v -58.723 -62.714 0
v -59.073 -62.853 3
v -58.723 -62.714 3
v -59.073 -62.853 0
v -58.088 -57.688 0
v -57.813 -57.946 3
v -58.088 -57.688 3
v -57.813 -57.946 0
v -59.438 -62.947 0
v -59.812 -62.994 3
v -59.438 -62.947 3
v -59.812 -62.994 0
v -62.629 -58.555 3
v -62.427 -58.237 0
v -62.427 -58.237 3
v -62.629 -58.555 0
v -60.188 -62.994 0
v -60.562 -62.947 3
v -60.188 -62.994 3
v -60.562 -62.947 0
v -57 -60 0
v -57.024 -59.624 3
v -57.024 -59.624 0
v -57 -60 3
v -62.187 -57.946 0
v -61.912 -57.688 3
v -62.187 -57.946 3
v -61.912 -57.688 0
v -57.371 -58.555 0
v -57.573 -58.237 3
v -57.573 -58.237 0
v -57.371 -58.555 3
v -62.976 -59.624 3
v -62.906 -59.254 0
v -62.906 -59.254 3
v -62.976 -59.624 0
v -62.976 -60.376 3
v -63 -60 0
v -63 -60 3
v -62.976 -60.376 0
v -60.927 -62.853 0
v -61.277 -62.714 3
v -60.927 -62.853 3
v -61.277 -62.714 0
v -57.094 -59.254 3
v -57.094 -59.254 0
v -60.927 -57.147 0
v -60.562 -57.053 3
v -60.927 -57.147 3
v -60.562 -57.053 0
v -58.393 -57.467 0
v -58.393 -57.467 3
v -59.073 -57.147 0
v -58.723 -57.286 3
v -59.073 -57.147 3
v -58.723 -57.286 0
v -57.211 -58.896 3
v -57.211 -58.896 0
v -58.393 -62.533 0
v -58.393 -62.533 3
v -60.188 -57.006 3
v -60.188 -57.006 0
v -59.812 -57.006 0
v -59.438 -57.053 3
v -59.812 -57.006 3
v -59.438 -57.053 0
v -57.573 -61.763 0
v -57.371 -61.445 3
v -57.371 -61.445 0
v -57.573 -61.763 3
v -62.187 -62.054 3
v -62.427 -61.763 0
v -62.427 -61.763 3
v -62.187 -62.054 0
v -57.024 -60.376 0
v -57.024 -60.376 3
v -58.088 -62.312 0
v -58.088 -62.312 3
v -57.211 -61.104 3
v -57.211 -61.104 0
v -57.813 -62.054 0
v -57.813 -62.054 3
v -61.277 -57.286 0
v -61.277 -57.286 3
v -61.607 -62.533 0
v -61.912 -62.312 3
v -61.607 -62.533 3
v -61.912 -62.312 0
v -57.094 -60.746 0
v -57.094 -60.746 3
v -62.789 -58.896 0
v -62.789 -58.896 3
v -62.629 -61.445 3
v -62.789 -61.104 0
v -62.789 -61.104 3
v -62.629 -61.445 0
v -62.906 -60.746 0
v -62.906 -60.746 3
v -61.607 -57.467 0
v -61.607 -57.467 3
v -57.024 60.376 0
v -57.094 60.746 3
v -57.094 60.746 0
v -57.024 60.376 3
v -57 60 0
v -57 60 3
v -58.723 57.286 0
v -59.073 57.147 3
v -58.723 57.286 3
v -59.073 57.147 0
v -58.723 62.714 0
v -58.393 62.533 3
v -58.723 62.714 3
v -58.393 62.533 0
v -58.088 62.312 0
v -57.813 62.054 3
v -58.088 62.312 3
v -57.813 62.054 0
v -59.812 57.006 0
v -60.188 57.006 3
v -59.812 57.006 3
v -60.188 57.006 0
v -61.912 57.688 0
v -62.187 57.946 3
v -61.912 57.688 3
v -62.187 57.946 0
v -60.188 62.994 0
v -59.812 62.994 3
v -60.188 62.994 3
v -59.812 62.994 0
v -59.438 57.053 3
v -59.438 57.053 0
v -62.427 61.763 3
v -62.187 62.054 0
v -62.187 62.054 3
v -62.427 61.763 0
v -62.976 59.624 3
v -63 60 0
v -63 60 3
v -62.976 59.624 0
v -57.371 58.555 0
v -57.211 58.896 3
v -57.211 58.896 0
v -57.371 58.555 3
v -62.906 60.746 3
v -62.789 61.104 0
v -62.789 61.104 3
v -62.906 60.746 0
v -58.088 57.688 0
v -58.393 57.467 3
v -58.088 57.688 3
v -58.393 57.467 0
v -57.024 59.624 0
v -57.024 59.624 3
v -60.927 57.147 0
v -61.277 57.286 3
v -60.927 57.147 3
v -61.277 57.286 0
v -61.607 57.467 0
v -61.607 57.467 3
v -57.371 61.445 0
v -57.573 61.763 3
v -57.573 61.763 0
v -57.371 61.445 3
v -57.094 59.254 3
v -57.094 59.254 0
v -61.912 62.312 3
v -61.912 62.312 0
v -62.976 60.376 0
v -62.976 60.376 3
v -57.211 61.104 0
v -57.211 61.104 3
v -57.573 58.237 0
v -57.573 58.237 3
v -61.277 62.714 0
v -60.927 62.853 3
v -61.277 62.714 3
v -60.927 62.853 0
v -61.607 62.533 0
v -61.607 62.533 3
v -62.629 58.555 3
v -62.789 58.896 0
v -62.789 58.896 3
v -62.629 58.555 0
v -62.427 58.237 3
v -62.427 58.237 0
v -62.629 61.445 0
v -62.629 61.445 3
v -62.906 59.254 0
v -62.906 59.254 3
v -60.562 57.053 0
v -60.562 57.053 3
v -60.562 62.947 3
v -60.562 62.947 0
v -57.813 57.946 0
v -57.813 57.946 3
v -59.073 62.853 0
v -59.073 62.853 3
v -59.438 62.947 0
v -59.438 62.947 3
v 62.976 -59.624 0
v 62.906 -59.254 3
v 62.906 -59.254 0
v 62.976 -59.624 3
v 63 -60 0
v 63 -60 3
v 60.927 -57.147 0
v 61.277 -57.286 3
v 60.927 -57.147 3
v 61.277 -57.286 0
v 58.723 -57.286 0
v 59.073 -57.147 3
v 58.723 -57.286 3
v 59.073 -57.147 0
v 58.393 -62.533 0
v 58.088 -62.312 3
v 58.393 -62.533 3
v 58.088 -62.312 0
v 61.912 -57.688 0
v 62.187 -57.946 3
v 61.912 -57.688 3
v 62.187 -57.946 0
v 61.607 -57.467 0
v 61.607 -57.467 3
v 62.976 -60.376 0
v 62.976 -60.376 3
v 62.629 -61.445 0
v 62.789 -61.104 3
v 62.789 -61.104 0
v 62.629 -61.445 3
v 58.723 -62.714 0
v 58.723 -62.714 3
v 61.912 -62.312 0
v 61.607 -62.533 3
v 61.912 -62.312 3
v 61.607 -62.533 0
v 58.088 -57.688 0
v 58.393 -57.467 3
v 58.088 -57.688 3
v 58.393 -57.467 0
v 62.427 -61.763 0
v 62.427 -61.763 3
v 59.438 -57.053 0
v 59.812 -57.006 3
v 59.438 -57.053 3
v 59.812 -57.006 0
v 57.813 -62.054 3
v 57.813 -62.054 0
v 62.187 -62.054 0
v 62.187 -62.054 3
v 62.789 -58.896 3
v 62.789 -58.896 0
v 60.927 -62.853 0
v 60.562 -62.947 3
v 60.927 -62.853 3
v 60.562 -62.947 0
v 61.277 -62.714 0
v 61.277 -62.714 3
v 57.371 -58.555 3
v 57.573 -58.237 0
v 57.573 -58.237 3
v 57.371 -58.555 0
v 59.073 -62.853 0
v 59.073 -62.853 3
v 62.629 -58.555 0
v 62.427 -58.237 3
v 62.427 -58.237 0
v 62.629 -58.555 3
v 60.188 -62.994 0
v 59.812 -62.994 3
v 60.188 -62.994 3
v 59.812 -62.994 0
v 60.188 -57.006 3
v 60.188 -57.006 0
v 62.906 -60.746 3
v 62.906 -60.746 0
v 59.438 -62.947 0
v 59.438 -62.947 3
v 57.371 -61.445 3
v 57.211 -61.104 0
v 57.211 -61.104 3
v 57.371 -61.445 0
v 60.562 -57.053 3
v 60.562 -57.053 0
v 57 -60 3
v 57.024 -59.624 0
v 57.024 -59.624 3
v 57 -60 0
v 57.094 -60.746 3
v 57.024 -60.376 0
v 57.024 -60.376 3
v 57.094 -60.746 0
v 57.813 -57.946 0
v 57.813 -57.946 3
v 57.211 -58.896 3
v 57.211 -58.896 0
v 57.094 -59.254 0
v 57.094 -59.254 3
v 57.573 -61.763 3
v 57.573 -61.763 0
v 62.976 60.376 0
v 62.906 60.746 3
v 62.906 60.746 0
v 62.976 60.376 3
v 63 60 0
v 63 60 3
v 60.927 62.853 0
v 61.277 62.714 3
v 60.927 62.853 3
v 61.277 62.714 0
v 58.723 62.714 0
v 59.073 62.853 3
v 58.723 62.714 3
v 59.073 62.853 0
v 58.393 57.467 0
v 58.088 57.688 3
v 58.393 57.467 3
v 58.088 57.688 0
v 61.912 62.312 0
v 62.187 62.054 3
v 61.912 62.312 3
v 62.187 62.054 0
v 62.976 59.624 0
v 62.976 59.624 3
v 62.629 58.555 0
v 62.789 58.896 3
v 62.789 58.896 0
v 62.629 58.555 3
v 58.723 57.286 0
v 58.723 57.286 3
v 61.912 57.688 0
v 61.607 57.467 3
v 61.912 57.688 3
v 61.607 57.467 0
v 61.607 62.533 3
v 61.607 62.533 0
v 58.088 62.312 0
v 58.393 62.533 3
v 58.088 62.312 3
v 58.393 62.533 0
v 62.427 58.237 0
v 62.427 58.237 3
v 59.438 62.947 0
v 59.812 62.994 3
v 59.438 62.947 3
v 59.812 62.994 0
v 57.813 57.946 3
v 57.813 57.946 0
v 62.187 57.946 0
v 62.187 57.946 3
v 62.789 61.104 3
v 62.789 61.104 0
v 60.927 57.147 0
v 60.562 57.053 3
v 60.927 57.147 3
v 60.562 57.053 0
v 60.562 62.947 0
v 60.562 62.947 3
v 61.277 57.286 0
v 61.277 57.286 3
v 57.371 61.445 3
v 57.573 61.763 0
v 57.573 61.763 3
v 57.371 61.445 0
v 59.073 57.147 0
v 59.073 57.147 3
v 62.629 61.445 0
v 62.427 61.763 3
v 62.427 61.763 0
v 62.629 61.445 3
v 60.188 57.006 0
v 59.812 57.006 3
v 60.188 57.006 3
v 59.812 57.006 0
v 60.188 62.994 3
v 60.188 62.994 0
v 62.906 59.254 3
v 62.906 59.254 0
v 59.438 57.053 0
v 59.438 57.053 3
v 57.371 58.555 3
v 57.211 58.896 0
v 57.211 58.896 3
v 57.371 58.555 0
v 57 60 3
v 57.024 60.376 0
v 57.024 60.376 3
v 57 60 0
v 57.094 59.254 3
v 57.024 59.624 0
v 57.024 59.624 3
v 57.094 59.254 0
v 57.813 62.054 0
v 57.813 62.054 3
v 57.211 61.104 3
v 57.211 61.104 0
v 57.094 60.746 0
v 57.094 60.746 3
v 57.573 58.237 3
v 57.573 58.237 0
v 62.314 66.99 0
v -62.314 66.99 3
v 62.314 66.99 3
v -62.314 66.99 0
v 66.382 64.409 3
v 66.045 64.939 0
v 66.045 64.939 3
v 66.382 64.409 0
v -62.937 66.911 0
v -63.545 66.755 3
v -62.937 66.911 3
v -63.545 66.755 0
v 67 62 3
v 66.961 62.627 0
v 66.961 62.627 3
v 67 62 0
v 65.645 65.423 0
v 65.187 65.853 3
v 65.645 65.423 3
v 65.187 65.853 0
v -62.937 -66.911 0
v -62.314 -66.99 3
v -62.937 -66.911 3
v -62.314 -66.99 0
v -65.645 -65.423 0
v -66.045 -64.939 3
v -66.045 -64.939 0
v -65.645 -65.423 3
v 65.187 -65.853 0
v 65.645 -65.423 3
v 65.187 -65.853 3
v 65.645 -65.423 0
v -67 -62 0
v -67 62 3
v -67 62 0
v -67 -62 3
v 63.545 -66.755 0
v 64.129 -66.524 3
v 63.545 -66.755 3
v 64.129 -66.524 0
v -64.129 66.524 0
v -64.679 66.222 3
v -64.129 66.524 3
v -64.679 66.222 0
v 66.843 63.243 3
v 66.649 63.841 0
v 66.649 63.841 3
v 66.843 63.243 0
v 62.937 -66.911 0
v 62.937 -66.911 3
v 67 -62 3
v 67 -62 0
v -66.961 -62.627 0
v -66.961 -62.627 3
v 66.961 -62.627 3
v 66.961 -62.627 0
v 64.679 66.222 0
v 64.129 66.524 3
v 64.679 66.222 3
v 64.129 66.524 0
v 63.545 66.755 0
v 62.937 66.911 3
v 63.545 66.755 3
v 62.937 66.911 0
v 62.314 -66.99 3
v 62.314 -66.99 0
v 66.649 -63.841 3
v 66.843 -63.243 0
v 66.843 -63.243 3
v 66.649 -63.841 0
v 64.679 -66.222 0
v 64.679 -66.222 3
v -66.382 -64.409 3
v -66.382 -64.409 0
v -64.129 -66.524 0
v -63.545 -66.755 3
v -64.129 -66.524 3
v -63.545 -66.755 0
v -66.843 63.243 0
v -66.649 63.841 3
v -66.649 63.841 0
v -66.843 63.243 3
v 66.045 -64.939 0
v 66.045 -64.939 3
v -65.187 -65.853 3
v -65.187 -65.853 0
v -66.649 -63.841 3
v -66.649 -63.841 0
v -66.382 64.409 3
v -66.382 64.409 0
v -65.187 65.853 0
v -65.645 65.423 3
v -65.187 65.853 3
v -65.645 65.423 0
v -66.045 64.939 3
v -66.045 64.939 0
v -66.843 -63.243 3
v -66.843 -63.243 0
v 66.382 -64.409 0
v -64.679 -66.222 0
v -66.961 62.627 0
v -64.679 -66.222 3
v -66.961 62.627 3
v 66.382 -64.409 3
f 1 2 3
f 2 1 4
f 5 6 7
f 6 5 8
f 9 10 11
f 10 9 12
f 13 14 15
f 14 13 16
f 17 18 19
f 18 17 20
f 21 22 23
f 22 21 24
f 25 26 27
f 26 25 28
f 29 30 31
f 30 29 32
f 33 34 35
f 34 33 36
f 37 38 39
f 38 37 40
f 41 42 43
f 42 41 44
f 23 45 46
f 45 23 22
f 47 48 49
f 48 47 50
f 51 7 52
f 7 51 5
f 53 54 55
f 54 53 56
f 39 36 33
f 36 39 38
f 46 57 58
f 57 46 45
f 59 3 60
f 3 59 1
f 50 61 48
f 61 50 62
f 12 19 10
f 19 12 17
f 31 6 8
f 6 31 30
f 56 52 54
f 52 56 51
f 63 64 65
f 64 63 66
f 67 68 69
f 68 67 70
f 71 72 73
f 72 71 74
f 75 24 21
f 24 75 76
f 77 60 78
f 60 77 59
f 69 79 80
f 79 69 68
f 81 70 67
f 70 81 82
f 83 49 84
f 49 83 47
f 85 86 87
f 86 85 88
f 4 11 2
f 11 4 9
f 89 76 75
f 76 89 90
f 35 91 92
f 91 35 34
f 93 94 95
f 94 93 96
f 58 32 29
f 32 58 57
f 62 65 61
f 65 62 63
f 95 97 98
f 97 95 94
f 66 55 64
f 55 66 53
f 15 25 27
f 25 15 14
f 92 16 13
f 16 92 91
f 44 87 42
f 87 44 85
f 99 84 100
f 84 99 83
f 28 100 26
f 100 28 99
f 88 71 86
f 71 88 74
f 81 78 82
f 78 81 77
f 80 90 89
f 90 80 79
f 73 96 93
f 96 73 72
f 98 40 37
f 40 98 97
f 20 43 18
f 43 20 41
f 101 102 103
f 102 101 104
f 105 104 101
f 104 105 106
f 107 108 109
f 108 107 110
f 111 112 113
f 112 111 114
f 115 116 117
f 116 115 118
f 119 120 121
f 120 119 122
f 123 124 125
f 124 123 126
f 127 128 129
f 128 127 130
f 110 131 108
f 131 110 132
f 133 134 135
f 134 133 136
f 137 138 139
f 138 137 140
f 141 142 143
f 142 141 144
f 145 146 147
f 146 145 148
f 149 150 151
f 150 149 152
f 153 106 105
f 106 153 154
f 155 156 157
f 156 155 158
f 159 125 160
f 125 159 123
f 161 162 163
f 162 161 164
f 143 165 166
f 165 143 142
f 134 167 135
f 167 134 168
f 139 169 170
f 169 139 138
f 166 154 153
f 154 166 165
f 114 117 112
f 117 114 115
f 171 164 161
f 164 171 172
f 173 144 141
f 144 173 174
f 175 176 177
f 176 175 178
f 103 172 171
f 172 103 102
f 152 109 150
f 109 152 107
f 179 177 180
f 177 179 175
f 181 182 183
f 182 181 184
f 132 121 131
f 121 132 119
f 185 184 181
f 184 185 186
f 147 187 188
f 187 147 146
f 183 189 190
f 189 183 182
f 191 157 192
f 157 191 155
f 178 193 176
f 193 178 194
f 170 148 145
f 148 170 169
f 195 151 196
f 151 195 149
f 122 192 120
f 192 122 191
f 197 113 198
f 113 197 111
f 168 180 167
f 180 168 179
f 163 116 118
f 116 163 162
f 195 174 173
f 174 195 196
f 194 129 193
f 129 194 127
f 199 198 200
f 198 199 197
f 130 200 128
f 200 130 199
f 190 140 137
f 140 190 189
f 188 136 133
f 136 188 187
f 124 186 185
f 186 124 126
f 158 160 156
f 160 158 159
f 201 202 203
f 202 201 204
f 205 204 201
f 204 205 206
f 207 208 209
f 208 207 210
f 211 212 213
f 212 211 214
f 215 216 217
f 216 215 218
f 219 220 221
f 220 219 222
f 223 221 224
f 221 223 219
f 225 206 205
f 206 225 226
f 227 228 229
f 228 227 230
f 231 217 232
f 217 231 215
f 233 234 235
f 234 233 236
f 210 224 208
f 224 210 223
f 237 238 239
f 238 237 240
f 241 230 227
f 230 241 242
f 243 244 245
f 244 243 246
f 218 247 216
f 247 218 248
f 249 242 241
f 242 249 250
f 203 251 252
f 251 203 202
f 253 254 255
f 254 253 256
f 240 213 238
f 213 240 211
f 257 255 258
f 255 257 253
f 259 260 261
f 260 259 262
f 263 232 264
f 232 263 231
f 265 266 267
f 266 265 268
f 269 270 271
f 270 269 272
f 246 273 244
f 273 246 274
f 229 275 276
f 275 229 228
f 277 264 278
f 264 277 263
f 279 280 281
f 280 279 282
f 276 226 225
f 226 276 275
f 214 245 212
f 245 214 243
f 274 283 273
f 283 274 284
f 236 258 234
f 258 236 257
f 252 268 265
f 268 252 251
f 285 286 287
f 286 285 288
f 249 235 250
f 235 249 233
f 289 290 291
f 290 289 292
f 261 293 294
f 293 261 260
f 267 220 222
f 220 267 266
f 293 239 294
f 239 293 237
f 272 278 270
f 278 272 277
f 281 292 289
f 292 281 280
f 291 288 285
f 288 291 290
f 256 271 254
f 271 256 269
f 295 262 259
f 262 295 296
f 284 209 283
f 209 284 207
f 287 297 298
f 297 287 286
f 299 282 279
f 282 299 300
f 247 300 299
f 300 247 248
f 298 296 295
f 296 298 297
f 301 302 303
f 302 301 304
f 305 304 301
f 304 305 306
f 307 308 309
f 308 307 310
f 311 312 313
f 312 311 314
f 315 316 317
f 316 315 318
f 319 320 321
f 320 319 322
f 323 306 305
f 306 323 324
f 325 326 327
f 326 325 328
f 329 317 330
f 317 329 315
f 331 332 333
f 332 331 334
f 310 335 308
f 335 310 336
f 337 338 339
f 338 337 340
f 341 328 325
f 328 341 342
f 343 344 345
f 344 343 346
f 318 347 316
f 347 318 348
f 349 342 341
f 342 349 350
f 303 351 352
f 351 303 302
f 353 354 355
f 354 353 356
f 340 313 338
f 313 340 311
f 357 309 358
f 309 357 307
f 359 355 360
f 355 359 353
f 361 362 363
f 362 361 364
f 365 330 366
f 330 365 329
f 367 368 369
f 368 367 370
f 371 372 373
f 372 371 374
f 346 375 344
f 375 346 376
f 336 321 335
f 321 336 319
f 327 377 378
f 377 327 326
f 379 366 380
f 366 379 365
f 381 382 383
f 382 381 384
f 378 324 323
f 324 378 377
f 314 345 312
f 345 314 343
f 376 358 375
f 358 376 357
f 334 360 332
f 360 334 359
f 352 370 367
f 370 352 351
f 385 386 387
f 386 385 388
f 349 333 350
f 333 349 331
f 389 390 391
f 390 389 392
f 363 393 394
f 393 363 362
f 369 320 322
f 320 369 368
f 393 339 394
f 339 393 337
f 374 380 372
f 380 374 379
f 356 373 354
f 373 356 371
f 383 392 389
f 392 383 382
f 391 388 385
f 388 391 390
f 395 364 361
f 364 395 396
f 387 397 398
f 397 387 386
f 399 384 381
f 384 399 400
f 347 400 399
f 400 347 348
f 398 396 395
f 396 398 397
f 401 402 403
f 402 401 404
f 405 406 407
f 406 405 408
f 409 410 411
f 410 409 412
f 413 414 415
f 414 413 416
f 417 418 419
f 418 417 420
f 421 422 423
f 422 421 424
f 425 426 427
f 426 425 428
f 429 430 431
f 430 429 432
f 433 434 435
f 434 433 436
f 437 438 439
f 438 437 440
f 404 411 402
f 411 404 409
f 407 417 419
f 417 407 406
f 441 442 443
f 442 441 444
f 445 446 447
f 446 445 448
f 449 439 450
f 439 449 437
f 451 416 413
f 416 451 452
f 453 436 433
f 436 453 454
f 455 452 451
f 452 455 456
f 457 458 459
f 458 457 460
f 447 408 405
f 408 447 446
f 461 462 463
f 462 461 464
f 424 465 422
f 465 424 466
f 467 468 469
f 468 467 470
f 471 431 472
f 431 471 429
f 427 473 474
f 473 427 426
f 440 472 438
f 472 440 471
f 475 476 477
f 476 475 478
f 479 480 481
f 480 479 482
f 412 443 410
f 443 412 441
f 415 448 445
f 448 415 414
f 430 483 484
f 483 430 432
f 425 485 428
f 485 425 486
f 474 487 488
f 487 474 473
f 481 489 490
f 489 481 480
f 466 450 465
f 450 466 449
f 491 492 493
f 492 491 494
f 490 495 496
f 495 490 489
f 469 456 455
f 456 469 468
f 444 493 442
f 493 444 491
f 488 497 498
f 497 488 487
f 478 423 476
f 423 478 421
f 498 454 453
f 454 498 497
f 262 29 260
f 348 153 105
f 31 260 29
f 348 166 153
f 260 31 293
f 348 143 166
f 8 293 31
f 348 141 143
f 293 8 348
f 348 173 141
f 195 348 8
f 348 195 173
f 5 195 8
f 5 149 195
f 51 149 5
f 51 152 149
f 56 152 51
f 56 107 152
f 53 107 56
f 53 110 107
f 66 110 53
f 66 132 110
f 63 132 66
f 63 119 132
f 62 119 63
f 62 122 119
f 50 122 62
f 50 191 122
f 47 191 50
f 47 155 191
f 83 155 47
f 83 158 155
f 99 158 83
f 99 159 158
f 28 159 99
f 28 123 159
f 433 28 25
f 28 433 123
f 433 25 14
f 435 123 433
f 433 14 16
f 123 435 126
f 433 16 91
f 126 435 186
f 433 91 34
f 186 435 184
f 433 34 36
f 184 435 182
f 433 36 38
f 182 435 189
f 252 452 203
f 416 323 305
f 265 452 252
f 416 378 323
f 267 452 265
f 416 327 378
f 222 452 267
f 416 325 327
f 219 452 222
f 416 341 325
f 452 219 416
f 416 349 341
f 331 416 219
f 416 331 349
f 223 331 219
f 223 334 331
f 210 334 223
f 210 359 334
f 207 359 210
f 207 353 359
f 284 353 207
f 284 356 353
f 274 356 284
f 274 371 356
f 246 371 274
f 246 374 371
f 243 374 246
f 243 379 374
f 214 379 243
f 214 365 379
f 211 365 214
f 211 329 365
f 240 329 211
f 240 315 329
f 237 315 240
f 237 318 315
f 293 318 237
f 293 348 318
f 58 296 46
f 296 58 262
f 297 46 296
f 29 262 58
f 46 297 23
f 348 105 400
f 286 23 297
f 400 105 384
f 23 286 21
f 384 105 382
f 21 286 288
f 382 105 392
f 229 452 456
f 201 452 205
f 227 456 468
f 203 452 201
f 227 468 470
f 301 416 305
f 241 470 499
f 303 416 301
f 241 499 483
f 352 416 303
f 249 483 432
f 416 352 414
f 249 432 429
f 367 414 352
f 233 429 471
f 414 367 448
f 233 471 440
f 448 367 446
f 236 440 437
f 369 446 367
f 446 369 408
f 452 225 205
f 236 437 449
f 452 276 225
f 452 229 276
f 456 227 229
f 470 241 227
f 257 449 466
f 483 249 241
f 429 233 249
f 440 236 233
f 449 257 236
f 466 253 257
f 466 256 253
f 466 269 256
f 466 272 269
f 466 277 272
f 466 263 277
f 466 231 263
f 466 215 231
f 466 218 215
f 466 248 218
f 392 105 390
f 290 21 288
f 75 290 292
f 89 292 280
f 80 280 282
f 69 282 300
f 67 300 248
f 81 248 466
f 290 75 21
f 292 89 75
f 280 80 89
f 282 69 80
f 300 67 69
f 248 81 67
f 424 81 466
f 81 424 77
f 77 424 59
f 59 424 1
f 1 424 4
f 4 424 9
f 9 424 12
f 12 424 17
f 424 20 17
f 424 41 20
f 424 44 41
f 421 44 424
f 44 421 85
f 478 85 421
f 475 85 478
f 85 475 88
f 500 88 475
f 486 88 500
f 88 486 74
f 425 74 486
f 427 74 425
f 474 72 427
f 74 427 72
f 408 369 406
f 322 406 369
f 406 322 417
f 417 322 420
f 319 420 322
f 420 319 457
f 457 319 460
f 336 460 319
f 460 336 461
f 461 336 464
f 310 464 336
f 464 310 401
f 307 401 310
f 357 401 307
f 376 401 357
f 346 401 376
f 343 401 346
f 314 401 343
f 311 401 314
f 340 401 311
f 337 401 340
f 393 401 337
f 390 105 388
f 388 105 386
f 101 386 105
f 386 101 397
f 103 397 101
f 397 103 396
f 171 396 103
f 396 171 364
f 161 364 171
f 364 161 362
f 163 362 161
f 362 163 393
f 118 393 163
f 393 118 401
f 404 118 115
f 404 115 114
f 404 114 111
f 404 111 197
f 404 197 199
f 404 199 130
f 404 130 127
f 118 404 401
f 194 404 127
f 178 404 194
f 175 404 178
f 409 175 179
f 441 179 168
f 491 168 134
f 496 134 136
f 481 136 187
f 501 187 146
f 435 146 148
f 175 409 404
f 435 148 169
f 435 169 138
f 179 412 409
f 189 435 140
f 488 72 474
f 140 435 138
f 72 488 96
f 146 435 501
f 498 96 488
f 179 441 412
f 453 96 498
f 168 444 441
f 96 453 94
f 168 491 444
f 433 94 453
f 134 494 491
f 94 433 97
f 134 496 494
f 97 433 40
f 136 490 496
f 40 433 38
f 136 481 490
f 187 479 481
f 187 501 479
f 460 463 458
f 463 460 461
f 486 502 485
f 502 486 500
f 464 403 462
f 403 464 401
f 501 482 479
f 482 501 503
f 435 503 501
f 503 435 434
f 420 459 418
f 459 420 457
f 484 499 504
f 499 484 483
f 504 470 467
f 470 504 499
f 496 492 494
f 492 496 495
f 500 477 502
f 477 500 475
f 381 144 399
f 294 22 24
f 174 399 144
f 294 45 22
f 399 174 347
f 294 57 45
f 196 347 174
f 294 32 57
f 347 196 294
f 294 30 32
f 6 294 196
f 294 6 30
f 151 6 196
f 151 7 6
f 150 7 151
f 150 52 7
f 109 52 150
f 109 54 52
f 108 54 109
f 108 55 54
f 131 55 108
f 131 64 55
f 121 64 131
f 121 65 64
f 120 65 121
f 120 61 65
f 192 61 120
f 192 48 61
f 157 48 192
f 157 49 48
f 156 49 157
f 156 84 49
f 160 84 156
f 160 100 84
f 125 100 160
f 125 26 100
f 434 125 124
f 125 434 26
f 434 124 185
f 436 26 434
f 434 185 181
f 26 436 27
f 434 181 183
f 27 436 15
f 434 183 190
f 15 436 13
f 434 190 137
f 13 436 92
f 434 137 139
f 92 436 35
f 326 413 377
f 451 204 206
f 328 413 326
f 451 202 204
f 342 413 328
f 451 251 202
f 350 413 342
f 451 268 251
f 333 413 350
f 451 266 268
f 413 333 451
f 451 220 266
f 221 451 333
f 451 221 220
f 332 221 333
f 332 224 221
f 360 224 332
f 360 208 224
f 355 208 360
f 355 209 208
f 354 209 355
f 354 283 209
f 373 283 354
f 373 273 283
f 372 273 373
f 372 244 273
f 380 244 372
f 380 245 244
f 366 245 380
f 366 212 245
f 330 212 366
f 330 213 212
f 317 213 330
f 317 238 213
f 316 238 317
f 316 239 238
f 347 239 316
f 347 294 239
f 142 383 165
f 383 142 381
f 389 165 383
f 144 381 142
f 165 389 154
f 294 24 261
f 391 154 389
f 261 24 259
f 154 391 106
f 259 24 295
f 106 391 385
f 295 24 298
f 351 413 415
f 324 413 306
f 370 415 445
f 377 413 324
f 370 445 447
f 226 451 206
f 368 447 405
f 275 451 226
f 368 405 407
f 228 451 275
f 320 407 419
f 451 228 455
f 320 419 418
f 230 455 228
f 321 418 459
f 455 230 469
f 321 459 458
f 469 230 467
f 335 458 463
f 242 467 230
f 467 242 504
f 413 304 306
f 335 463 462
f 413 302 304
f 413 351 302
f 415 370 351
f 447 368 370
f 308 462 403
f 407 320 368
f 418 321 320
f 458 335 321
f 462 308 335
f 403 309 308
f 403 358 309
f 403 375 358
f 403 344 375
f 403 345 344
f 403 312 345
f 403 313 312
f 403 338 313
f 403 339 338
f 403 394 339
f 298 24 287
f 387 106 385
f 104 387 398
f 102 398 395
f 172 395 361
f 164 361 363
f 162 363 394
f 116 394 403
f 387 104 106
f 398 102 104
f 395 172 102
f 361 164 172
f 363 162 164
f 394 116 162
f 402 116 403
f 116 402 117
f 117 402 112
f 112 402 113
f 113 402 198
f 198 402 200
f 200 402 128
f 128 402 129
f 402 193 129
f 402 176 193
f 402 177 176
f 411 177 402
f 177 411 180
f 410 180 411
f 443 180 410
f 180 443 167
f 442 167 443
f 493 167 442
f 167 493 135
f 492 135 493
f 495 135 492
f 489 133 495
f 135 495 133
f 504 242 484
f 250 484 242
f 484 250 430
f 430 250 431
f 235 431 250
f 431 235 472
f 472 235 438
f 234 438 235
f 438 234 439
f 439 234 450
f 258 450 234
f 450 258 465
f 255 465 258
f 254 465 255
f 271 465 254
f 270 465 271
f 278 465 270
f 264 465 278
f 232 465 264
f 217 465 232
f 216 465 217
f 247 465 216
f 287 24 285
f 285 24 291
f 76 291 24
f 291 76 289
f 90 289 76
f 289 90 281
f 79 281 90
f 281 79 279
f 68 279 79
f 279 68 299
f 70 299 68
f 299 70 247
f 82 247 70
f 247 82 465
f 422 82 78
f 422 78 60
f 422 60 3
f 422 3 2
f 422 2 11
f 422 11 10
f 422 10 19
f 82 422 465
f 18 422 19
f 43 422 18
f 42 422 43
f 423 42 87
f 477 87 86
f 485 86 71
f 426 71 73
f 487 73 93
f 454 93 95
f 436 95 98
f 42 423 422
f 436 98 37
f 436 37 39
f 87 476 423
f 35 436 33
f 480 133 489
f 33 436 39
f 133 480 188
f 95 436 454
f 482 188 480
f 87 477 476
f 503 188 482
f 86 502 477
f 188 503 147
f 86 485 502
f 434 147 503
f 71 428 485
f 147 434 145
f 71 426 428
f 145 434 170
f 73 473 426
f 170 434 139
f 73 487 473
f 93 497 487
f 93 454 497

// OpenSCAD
$fn = 50;


difference() {
	union() {
		hull() {
			translate(v = [-62.0000000000, 62.0000000000, 0]) {
				cylinder(h = 3, r = 5);
			}
			translate(v = [62.0000000000, 62.0000000000, 0]) {
				cylinder(h = 3, r = 5);
			}
			translate(v = [-62.0000000000, -62.0000000000, 0]) {
				cylinder(h = 3, r = 5);
			}
			translate(v = [62.0000000000, -62.0000000000, 0]) {
				cylinder(h = 3, r = 5);
			}
		}
	}
	union() {
		translate(v = [-60.0000000000, -60.0000000000, -100.0000000000]) {
			cylinder(h = 200, r = 3.0000000000);
		}
		translate(v = [-60.0000000000, 60.0000000000, -100.0000000000]) {
			cylinder(h = 200, r = 3.0000000000);
		}
		translate(v = [60.0000000000, -60.0000000000, -100.0000000000]) {
			cylinder(h = 200, r = 3.0000000000);
		}
		translate(v = [60.0000000000, 60.0000000000, -100.0000000000]) {
			cylinder(h = 200, r = 3.0000000000);
		}
	}
}
